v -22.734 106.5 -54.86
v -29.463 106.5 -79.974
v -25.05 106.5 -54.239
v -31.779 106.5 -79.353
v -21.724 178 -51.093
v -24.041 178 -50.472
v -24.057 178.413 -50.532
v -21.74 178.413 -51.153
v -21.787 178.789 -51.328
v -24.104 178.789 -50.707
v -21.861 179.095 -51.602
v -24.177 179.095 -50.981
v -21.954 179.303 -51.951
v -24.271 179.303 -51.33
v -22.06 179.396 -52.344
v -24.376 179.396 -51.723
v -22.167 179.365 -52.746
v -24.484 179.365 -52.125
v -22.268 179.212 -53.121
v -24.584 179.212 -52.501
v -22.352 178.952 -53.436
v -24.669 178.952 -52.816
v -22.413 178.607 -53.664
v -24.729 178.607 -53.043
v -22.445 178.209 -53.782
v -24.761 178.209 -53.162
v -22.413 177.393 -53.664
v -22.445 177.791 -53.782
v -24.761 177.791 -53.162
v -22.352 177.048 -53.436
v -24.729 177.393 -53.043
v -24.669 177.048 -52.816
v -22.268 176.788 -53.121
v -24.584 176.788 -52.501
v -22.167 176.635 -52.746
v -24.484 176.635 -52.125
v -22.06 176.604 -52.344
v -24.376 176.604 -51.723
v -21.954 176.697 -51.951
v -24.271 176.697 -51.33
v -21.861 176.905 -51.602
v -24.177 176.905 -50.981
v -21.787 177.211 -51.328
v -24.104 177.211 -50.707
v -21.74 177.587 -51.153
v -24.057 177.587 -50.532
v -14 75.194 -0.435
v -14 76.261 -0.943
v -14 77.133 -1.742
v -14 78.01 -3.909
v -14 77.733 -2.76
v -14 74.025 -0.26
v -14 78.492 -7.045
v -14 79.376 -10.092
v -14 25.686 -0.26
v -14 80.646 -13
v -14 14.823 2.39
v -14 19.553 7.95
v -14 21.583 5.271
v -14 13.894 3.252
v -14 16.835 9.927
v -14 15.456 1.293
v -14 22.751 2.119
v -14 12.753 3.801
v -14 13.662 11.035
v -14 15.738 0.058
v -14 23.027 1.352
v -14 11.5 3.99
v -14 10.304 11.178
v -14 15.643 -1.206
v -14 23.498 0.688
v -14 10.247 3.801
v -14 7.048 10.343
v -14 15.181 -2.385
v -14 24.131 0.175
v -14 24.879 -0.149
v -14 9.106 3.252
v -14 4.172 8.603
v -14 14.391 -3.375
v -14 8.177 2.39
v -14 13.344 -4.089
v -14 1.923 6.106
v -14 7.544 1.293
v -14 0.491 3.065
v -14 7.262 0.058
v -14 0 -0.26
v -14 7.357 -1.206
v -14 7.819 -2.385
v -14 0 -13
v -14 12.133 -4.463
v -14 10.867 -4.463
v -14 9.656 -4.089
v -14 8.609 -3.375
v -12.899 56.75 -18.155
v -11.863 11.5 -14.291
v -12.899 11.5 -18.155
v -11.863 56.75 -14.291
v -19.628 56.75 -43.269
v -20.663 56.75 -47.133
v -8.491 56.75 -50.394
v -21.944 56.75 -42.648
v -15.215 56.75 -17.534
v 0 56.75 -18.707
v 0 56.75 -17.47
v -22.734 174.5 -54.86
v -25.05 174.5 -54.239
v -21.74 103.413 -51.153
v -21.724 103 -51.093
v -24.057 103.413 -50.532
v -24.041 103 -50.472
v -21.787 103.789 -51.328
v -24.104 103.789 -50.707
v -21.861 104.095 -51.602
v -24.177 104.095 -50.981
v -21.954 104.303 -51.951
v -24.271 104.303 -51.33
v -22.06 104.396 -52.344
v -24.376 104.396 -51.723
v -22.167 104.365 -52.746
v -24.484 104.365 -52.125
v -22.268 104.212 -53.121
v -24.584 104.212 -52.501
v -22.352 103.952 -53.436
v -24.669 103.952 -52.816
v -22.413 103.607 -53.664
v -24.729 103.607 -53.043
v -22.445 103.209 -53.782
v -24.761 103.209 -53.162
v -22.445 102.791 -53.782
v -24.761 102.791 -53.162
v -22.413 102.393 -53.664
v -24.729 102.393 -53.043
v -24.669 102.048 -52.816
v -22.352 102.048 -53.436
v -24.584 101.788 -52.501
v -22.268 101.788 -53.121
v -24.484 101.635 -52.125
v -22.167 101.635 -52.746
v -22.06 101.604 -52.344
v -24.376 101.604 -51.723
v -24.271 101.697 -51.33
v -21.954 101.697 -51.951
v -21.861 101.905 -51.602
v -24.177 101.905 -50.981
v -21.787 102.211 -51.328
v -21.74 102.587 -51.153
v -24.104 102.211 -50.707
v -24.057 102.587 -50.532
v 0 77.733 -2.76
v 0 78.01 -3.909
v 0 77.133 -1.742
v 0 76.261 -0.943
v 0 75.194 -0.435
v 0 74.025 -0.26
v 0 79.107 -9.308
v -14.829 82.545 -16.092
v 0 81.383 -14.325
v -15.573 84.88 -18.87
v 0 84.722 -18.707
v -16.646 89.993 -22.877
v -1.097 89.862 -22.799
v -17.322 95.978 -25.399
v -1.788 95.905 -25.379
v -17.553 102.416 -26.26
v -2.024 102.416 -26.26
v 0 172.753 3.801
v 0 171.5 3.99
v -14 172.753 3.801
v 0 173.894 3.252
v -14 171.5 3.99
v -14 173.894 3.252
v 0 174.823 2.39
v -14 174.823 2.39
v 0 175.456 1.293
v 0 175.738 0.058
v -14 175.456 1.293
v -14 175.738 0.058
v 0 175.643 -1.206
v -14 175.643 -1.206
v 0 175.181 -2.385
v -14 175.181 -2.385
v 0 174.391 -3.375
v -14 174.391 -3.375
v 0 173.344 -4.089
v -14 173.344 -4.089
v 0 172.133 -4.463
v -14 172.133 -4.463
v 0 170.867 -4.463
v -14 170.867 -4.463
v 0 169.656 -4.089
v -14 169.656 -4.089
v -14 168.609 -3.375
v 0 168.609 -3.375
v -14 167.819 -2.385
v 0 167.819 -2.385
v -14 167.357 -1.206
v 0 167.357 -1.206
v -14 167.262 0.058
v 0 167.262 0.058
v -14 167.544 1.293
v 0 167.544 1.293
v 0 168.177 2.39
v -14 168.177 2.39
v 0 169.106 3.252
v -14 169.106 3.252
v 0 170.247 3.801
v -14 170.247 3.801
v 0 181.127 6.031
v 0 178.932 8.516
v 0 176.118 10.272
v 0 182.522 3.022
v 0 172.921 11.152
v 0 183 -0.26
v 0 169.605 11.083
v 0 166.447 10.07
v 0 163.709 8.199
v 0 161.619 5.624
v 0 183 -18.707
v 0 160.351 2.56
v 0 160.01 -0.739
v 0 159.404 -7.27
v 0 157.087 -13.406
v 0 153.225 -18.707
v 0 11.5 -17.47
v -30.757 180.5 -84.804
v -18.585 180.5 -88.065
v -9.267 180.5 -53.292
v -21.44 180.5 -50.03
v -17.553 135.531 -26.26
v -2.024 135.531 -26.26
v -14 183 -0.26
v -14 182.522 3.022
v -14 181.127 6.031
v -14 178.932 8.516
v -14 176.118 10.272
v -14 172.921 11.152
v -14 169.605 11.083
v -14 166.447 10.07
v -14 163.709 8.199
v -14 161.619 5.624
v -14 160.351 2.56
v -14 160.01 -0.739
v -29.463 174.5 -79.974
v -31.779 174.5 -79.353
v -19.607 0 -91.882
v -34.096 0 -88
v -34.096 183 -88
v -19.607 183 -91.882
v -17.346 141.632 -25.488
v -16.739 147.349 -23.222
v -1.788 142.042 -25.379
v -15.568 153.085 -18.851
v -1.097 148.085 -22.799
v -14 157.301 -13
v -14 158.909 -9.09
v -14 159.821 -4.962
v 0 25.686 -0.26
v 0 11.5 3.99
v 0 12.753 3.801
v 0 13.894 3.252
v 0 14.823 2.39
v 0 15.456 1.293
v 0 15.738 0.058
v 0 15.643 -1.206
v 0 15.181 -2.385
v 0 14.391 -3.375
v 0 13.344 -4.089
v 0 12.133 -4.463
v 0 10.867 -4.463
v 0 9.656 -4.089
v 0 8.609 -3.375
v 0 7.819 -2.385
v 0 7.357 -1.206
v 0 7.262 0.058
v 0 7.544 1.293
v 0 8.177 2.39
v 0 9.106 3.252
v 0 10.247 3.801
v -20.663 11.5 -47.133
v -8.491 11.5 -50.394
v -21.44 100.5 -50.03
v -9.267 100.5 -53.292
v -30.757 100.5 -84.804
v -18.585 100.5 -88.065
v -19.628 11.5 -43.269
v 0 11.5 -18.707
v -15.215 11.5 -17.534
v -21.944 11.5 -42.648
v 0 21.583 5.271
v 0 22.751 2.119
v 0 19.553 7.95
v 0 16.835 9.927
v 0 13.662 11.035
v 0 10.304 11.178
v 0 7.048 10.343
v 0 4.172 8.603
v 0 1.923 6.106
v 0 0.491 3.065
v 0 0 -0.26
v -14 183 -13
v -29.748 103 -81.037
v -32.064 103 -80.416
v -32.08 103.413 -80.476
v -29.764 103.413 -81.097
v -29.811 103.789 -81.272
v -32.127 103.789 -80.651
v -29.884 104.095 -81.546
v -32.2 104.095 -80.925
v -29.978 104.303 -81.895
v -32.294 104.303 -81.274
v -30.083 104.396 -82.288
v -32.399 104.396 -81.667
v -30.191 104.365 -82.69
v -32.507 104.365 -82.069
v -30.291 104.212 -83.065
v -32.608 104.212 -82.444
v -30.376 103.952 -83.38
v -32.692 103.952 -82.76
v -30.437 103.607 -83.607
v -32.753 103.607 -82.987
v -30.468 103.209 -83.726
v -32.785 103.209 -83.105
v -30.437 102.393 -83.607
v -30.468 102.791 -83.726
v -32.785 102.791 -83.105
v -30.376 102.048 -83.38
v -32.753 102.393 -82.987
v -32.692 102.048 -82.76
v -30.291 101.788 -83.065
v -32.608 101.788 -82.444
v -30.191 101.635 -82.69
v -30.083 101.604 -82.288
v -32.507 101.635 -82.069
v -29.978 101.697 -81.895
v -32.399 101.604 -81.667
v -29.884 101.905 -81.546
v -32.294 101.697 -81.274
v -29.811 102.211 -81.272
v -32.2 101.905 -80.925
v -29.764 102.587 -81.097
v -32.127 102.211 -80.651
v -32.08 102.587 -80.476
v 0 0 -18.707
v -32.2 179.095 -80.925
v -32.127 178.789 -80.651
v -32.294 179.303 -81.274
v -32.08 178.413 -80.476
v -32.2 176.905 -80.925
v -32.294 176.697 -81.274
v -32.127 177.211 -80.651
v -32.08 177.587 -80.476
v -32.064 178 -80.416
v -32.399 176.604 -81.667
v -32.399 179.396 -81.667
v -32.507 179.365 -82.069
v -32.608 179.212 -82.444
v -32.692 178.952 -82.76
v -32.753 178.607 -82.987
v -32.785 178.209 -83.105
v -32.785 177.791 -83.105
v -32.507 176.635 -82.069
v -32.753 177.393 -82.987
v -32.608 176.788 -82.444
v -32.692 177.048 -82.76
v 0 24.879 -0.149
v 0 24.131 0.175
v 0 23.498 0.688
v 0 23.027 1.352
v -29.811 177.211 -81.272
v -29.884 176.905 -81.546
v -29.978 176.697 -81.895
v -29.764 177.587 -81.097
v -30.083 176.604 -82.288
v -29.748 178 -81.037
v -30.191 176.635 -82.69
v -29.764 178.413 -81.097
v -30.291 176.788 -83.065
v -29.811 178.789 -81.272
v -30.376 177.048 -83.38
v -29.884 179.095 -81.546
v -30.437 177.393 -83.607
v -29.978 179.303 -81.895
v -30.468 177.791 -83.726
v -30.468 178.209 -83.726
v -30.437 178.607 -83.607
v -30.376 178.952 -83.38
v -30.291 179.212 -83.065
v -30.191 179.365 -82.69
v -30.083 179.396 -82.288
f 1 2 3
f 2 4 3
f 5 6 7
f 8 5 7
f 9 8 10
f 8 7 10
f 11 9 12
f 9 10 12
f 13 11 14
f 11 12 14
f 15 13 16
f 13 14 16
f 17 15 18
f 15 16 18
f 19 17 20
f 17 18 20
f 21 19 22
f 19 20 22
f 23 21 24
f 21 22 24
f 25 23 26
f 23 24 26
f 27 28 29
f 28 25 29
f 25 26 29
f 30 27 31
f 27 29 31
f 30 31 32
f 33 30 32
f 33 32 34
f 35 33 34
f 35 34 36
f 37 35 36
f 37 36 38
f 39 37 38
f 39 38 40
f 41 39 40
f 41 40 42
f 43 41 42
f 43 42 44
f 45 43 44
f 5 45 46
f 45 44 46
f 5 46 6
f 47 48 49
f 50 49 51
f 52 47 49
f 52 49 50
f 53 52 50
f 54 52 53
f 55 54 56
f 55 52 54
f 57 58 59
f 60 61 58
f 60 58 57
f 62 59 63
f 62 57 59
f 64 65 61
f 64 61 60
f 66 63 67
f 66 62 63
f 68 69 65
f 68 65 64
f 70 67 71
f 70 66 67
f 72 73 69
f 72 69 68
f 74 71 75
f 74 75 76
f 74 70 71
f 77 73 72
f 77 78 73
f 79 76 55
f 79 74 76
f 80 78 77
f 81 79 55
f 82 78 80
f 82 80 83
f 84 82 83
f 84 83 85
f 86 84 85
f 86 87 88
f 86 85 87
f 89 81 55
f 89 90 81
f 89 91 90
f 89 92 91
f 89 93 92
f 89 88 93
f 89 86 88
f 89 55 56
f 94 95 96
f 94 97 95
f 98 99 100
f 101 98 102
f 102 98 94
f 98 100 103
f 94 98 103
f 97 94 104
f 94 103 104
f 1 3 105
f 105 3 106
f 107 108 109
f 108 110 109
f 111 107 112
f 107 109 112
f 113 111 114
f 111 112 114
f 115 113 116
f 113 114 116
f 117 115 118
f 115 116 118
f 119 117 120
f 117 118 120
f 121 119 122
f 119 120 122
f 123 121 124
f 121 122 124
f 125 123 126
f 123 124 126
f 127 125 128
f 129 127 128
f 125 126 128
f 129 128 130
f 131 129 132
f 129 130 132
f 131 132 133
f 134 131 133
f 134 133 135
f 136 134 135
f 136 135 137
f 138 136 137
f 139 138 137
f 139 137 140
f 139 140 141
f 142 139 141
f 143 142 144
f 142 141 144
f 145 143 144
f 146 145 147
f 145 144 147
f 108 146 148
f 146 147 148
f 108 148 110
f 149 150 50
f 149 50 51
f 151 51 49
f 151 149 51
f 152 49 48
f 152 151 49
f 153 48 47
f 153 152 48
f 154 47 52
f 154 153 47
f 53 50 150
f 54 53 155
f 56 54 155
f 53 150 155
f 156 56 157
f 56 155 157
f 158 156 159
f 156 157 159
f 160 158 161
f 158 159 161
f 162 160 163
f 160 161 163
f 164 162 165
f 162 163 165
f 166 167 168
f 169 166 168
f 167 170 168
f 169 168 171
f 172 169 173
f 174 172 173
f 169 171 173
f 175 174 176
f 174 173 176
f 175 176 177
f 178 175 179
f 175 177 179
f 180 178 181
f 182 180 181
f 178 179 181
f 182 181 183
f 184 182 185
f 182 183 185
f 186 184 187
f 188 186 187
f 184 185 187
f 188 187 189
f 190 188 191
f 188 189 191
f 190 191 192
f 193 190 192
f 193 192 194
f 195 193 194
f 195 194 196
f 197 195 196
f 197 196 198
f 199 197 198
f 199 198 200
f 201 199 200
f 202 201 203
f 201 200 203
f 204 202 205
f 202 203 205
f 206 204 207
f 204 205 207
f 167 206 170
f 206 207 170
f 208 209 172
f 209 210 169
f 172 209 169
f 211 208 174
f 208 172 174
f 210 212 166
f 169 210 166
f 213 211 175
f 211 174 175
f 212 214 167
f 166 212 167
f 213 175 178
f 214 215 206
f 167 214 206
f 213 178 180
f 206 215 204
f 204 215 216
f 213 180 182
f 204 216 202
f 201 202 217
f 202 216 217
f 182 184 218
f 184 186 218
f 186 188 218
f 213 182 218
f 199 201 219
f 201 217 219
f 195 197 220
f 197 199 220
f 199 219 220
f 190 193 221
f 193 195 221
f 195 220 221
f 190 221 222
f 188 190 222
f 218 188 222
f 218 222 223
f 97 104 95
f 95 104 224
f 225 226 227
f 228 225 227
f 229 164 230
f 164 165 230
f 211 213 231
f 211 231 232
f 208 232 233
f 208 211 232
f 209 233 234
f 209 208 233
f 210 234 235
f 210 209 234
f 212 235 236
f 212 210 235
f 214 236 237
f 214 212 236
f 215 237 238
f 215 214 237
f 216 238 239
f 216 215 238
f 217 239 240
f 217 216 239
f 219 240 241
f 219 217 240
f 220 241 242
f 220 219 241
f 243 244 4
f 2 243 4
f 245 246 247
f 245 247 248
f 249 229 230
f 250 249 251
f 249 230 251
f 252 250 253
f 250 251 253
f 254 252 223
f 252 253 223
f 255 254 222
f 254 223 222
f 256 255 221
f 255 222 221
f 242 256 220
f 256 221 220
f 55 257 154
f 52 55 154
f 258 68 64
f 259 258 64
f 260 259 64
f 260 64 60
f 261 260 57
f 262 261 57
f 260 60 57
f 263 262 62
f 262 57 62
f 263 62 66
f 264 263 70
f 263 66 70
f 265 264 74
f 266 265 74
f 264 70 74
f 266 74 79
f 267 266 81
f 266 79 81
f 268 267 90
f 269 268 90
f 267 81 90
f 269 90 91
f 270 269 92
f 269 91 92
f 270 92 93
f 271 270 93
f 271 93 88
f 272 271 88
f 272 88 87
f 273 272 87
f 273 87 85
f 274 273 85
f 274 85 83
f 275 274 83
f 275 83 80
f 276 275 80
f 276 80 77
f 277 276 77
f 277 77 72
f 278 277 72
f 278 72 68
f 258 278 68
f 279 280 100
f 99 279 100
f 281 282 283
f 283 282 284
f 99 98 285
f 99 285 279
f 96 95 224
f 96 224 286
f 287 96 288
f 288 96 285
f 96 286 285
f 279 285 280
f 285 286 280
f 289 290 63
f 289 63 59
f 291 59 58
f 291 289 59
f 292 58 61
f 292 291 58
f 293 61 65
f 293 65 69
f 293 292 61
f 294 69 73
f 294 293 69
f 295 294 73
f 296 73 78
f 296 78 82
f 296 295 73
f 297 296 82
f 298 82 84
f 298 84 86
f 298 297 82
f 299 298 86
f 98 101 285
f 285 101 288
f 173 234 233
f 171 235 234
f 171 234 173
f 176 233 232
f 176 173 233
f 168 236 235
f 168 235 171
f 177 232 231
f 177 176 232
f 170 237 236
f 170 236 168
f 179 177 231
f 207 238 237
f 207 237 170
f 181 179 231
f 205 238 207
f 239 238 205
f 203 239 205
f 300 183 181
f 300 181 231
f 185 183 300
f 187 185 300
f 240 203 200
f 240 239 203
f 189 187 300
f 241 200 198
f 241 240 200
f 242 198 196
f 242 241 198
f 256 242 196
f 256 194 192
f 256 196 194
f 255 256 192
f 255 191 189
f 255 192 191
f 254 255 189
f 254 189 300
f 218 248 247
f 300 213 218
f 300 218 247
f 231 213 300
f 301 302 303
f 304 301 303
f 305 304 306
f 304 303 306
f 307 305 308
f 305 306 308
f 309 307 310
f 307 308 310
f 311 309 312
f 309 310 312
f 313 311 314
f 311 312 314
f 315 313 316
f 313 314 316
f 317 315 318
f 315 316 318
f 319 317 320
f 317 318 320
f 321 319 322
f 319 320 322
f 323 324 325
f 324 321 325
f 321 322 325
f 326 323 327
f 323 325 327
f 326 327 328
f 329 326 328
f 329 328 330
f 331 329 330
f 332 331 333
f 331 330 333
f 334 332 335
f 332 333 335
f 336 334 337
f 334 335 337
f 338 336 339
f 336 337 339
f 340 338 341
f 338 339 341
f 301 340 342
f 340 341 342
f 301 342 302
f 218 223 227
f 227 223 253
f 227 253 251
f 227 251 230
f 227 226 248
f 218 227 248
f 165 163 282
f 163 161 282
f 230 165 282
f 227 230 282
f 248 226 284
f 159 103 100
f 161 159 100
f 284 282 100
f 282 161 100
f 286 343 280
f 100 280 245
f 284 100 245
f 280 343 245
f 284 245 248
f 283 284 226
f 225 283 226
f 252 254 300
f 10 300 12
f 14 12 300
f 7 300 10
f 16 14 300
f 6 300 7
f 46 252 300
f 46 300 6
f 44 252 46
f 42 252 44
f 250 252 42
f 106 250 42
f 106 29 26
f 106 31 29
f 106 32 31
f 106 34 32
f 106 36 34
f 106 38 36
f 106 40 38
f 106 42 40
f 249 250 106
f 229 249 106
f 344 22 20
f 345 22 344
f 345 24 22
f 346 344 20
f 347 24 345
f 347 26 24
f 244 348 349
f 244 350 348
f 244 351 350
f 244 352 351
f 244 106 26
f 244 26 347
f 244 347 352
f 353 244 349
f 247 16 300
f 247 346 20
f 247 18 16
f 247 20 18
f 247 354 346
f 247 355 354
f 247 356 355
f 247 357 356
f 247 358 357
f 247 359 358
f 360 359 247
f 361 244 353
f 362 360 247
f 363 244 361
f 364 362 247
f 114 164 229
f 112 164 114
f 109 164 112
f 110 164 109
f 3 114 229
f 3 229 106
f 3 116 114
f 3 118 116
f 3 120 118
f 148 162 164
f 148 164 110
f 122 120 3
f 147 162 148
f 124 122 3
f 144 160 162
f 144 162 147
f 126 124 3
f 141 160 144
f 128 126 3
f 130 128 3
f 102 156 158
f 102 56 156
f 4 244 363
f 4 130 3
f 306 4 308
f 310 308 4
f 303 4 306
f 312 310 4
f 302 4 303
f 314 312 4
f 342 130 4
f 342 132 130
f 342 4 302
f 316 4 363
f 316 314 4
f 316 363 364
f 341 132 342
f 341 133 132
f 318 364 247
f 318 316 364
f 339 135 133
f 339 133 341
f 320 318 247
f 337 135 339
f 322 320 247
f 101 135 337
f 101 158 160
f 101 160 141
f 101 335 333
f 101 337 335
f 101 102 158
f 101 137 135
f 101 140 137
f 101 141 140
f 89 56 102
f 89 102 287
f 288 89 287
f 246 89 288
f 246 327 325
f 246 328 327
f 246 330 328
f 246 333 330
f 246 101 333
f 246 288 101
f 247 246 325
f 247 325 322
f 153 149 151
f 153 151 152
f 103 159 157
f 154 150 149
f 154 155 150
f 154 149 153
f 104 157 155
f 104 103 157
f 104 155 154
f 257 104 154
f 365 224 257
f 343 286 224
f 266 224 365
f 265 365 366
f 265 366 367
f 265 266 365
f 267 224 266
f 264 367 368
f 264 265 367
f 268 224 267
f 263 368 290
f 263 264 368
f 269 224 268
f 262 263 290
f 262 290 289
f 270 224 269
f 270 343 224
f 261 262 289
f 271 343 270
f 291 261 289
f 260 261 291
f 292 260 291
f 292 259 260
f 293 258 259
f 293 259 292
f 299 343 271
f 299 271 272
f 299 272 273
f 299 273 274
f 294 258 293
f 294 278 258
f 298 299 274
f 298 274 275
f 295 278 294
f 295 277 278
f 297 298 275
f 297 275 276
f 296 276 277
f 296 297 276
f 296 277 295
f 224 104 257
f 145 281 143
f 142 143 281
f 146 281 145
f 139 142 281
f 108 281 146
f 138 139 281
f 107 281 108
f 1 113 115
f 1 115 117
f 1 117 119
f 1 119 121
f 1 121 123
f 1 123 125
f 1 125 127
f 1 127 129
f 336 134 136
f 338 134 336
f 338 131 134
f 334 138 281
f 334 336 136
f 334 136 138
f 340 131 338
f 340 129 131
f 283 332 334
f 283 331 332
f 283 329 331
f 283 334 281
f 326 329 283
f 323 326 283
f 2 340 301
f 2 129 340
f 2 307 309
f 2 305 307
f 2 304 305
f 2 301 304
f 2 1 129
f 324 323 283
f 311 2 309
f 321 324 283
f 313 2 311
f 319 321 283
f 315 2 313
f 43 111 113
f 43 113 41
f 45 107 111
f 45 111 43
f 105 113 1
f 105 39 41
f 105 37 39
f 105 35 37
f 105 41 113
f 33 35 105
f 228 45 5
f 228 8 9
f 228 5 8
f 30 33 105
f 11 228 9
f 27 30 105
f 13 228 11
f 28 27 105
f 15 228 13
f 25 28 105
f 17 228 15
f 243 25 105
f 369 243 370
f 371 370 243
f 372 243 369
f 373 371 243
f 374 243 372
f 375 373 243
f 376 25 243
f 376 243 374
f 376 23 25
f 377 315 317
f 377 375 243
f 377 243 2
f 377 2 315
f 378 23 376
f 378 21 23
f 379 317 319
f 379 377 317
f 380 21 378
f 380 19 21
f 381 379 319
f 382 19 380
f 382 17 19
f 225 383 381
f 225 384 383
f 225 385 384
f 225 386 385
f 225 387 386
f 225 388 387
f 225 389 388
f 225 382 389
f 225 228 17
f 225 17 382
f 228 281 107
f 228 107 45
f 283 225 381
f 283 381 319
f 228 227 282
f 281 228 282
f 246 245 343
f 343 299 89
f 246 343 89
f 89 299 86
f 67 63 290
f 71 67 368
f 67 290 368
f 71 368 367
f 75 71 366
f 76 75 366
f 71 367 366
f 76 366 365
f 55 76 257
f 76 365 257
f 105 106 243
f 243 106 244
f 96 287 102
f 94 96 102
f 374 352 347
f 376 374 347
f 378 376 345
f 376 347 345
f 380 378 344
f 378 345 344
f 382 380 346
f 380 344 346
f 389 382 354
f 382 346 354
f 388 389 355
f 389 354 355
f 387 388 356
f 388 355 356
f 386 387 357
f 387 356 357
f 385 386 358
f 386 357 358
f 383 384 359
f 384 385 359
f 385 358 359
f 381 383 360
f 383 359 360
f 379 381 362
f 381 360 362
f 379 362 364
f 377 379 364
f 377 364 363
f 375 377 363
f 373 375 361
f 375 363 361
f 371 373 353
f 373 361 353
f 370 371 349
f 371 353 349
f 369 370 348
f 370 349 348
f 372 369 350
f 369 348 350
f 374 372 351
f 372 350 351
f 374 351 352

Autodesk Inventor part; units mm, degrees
ref_plane "YZ Plane" through (0, 0, 0) normal (1, 0, 0) x (0, 1, 0)
ref_plane "XZ Plane" through (0, 0, 0) normal (0, 1, 0) x (-1, 0, 0)
ref_plane "XY Plane" through (0, 0, 0) normal (0, 0, 1) x (1, 0, 0)
sketch "Sketch1" plane through (0, 0, 0) normal (0, 1, 0) x (-1, 0, 0)
  line L0 (0, 0) -> (0, -18.7068)
  line L1 (0, -18.7068) -> (19.6073, -91.8823)
  line L2 (0, 0) -> (0, 11.24)
  line L3 (0, 11.24) -> (14, 11.24)
  line L4 (14, 11.24) -> (14, -13)
  line L5 (14, -13) -> (34.0962, -88)
  line L6 (34.0962, -88) -> (19.6073, -91.8823)
  dimension "d1" = 14
  dimension "d2" = 11.24
  dimension "d4" = 15
  dimension "d13" = 15
  dimension "d14" = 13
  dimension "d35" = 88
extrude "Extrusion1" add sketch "Sketch1" along normal blind 183
sketch "Sketch2" plane through (-14, 0, -13) normal (-1, 0, 0) x (0, 0, 1)
  line L0 (0, 183) -> (24.24, 183) projected
  circle A0 centre (12.74, 171.5) radius 4.25
  circle A1 centre (12.74, 11.5) radius 4.25
  line L1 (24.24, 0) -> (24.24, 183) projected
  line L2 (0, 0) -> (24.24, 0) projected
  arc A2 (12.74, 0) -> (15.1193, 22.7512) centre (12.74, 11.5) ccw
  arc A3 (12.2608, 160.01) -> (12.74, 183) centre (12.74, 171.5) ccw
  line L3 (-13.26, 102.4155) -> (-13.26, 135.5313)
  arc A4 (12.2608, 160.01) -> (-13.26, 135.5313) centre (11.24, 135.5313) ccw
  circle A5 centre (20.1015, 118.5) radius 28 construction
  line L4 (12.74, 25.6863) -> (12.74, 74.0254)
  arc A6 (12.74, 25.6863) -> (15.1193, 22.7512) centre (15.74, 25.6863) ccw
  arc A7 (-13.26, 102.4155) -> (9.0909, 78.01) centre (11.24, 102.4155) ccw
  arc A8 (12.74, 74.0254) -> (9.0909, 78.01) centre (8.74, 74.0254) ccw
  line L5 (24.24, 0) -> (24.24, 183) projected
  line L6 (12.74, 0) -> (24.24, 0)
  line L7 (24.24, 11.5) -> (24.24, 171.5)
  line L8 (24.24, 183) -> (12.74, 183)
  line L9 (24.24, 11.5) -> (24.24, 0)
  line L10 (24.24, 171.5) -> (24.24, 183)
  point P0 (13, 0)
  point P1 (12.74, 23)
  point P2 (12.74, 77.9615)
  dimension "d17" = 160
  dimension "d18" = 183
  dimension "d19" = 11.5
  dimension "d20" = 11.5
  dimension "d21" = 11.5
  dimension "d22" = 26
  dimension "d23" = 56
  dimension "d24" = 53
  dimension "d25" = 3
  dimension "d26" = 0
  dimension "d27" = 24.5
  dimension "d28" = 4
  dimension "d30" = 82
  dimension "d31" = 8.5
  dimension "d32" = 4.1385
extrude "Extrusion2" cut sketch "Sketch2" along normal through all both and the other way through all
sketch "Sketch3" plane through (-34.0962, 0, -88) normal (-0.9659258, 0, 0.258819) x (0.258819, 0, 0.9659258)
  line L0 (46.9516, 11.5) -> (72.9516, 11.5)
  line L1 (72.9516, 11.5) -> (72.9516, 56.75)
  line L2 (72.9516, 56.75) -> (46.9516, 56.75)
  line L3 (46.9516, 56.75) -> (46.9516, 11.5)
  ellipse E0 centre (89.9516, 11.5) end of major axis (89.9516, 23) minor radius 11.1081 (89.9516, 0) -> (92.2498, 22.7512) ccw projected
  line L4 (8.9516, 106.5) -> (34.9516, 106.5)
  line L5 (34.9516, 106.5) -> (34.9516, 174.5)
  line L6 (34.9516, 174.5) -> (8.9516, 174.5)
  line L7 (8.9516, 174.5) -> (8.9516, 106.5)
  circle A0 centre (6.4516, 103) radius 1.4
  circle A1 centre (37.4516, 103) radius 1.4
  circle A2 centre (37.4516, 178) radius 1.4
  circle A3 centre (6.4516, 178) radius 1.4
  line L8 (6.4516, 103) -> (37.4516, 103) construction
  line L9 (37.4516, 103) -> (37.4516, 178) construction
  line L10 (37.4516, 178) -> (6.4516, 178) construction
  line L11 (6.4516, 178) -> (6.4516, 103) construction
  point P0 (93.8262, 0)
  dimension "d36" = 45.25
  dimension "d37" = 26
  dimension "d38" = 17
  dimension "d39" = 0
  dimension "d46" = 26
  dimension "d47" = 31
  dimension "d48" = 75
  dimension "d49" = 3.5
  dimension "d50" = 68
  dimension "d51" = 2.5
  dimension "d52" = 55
  dimension "d53" = 95
  dimension "d54" = 2.8
extrude "top" cut sketch "Sketch3" against normal blind 183
sketch "Sketch4" plane through (-19.6073, 0, -91.8823) normal (0.9659258, 0, -0.258819) x (-0.258819, 0, -0.9659258)
  line L0 (-46.9516, 56.75) -> (-46.9516, 11.5) projected
  line L1 (-72.9516, 11.5) -> (-72.9516, 56.75) projected
  line L2 (-42.9516, 56.75) -> (-76.9516, 56.75)
  line L3 (-76.9516, 56.75) -> (-76.9516, 11.5)
  line L4 (-76.9516, 11.5) -> (-42.9516, 11.5)
  line L5 (-42.9516, 11.5) -> (-42.9516, 56.75)
  line L6 (-72.9516, 56.75) -> (-46.9516, 56.75) projected
  line L7 (-46.9516, 11.5) -> (-72.9516, 11.5) projected
  line L8 (-3.9516, 180.5) -> (-39.9516, 180.5)
  line L9 (-39.9516, 180.5) -> (-39.9516, 100.5)
  line L10 (-39.9516, 100.5) -> (-3.9516, 100.5)
  line L11 (-3.9516, 100.5) -> (-3.9516, 180.5)
  circle A0 centre (-6.4516, 103) radius 1.4 projected
  circle A1 centre (-6.4516, 178) radius 1.4 projected
  circle A2 centre (-37.4516, 178) radius 1.4 projected
  point P0 (-93.8262, 0)
  dimension "d42" = 4
  dimension "d43" = 4
  dimension "d55" = 2.5
  dimension "d56" = 2.5
  dimension "d57" = 2.5
  dimension "d59" = 2.5
extrude "back" cut sketch "Sketch4" against normal blind 12.6 contours L2 L5 L4 L0 | L1 L4 L3 L2 | L11 L10 L9 L8
equation "\"d19\" = -0.5 * d17 + 0.5 * d18"
equation "\"d21\" = d20"
equation "\"d49\" = -0.5 * d50 + 0.5 * d48"
equation "\"d51\" = -0.5 * d46 + 0.5 * d47"
equation "\"d43\" = d42"
equation "\"d56\" = d55"
equation "\"d57\" = d55"
equation "\"d59\" = d55"
properties part number "dash"
